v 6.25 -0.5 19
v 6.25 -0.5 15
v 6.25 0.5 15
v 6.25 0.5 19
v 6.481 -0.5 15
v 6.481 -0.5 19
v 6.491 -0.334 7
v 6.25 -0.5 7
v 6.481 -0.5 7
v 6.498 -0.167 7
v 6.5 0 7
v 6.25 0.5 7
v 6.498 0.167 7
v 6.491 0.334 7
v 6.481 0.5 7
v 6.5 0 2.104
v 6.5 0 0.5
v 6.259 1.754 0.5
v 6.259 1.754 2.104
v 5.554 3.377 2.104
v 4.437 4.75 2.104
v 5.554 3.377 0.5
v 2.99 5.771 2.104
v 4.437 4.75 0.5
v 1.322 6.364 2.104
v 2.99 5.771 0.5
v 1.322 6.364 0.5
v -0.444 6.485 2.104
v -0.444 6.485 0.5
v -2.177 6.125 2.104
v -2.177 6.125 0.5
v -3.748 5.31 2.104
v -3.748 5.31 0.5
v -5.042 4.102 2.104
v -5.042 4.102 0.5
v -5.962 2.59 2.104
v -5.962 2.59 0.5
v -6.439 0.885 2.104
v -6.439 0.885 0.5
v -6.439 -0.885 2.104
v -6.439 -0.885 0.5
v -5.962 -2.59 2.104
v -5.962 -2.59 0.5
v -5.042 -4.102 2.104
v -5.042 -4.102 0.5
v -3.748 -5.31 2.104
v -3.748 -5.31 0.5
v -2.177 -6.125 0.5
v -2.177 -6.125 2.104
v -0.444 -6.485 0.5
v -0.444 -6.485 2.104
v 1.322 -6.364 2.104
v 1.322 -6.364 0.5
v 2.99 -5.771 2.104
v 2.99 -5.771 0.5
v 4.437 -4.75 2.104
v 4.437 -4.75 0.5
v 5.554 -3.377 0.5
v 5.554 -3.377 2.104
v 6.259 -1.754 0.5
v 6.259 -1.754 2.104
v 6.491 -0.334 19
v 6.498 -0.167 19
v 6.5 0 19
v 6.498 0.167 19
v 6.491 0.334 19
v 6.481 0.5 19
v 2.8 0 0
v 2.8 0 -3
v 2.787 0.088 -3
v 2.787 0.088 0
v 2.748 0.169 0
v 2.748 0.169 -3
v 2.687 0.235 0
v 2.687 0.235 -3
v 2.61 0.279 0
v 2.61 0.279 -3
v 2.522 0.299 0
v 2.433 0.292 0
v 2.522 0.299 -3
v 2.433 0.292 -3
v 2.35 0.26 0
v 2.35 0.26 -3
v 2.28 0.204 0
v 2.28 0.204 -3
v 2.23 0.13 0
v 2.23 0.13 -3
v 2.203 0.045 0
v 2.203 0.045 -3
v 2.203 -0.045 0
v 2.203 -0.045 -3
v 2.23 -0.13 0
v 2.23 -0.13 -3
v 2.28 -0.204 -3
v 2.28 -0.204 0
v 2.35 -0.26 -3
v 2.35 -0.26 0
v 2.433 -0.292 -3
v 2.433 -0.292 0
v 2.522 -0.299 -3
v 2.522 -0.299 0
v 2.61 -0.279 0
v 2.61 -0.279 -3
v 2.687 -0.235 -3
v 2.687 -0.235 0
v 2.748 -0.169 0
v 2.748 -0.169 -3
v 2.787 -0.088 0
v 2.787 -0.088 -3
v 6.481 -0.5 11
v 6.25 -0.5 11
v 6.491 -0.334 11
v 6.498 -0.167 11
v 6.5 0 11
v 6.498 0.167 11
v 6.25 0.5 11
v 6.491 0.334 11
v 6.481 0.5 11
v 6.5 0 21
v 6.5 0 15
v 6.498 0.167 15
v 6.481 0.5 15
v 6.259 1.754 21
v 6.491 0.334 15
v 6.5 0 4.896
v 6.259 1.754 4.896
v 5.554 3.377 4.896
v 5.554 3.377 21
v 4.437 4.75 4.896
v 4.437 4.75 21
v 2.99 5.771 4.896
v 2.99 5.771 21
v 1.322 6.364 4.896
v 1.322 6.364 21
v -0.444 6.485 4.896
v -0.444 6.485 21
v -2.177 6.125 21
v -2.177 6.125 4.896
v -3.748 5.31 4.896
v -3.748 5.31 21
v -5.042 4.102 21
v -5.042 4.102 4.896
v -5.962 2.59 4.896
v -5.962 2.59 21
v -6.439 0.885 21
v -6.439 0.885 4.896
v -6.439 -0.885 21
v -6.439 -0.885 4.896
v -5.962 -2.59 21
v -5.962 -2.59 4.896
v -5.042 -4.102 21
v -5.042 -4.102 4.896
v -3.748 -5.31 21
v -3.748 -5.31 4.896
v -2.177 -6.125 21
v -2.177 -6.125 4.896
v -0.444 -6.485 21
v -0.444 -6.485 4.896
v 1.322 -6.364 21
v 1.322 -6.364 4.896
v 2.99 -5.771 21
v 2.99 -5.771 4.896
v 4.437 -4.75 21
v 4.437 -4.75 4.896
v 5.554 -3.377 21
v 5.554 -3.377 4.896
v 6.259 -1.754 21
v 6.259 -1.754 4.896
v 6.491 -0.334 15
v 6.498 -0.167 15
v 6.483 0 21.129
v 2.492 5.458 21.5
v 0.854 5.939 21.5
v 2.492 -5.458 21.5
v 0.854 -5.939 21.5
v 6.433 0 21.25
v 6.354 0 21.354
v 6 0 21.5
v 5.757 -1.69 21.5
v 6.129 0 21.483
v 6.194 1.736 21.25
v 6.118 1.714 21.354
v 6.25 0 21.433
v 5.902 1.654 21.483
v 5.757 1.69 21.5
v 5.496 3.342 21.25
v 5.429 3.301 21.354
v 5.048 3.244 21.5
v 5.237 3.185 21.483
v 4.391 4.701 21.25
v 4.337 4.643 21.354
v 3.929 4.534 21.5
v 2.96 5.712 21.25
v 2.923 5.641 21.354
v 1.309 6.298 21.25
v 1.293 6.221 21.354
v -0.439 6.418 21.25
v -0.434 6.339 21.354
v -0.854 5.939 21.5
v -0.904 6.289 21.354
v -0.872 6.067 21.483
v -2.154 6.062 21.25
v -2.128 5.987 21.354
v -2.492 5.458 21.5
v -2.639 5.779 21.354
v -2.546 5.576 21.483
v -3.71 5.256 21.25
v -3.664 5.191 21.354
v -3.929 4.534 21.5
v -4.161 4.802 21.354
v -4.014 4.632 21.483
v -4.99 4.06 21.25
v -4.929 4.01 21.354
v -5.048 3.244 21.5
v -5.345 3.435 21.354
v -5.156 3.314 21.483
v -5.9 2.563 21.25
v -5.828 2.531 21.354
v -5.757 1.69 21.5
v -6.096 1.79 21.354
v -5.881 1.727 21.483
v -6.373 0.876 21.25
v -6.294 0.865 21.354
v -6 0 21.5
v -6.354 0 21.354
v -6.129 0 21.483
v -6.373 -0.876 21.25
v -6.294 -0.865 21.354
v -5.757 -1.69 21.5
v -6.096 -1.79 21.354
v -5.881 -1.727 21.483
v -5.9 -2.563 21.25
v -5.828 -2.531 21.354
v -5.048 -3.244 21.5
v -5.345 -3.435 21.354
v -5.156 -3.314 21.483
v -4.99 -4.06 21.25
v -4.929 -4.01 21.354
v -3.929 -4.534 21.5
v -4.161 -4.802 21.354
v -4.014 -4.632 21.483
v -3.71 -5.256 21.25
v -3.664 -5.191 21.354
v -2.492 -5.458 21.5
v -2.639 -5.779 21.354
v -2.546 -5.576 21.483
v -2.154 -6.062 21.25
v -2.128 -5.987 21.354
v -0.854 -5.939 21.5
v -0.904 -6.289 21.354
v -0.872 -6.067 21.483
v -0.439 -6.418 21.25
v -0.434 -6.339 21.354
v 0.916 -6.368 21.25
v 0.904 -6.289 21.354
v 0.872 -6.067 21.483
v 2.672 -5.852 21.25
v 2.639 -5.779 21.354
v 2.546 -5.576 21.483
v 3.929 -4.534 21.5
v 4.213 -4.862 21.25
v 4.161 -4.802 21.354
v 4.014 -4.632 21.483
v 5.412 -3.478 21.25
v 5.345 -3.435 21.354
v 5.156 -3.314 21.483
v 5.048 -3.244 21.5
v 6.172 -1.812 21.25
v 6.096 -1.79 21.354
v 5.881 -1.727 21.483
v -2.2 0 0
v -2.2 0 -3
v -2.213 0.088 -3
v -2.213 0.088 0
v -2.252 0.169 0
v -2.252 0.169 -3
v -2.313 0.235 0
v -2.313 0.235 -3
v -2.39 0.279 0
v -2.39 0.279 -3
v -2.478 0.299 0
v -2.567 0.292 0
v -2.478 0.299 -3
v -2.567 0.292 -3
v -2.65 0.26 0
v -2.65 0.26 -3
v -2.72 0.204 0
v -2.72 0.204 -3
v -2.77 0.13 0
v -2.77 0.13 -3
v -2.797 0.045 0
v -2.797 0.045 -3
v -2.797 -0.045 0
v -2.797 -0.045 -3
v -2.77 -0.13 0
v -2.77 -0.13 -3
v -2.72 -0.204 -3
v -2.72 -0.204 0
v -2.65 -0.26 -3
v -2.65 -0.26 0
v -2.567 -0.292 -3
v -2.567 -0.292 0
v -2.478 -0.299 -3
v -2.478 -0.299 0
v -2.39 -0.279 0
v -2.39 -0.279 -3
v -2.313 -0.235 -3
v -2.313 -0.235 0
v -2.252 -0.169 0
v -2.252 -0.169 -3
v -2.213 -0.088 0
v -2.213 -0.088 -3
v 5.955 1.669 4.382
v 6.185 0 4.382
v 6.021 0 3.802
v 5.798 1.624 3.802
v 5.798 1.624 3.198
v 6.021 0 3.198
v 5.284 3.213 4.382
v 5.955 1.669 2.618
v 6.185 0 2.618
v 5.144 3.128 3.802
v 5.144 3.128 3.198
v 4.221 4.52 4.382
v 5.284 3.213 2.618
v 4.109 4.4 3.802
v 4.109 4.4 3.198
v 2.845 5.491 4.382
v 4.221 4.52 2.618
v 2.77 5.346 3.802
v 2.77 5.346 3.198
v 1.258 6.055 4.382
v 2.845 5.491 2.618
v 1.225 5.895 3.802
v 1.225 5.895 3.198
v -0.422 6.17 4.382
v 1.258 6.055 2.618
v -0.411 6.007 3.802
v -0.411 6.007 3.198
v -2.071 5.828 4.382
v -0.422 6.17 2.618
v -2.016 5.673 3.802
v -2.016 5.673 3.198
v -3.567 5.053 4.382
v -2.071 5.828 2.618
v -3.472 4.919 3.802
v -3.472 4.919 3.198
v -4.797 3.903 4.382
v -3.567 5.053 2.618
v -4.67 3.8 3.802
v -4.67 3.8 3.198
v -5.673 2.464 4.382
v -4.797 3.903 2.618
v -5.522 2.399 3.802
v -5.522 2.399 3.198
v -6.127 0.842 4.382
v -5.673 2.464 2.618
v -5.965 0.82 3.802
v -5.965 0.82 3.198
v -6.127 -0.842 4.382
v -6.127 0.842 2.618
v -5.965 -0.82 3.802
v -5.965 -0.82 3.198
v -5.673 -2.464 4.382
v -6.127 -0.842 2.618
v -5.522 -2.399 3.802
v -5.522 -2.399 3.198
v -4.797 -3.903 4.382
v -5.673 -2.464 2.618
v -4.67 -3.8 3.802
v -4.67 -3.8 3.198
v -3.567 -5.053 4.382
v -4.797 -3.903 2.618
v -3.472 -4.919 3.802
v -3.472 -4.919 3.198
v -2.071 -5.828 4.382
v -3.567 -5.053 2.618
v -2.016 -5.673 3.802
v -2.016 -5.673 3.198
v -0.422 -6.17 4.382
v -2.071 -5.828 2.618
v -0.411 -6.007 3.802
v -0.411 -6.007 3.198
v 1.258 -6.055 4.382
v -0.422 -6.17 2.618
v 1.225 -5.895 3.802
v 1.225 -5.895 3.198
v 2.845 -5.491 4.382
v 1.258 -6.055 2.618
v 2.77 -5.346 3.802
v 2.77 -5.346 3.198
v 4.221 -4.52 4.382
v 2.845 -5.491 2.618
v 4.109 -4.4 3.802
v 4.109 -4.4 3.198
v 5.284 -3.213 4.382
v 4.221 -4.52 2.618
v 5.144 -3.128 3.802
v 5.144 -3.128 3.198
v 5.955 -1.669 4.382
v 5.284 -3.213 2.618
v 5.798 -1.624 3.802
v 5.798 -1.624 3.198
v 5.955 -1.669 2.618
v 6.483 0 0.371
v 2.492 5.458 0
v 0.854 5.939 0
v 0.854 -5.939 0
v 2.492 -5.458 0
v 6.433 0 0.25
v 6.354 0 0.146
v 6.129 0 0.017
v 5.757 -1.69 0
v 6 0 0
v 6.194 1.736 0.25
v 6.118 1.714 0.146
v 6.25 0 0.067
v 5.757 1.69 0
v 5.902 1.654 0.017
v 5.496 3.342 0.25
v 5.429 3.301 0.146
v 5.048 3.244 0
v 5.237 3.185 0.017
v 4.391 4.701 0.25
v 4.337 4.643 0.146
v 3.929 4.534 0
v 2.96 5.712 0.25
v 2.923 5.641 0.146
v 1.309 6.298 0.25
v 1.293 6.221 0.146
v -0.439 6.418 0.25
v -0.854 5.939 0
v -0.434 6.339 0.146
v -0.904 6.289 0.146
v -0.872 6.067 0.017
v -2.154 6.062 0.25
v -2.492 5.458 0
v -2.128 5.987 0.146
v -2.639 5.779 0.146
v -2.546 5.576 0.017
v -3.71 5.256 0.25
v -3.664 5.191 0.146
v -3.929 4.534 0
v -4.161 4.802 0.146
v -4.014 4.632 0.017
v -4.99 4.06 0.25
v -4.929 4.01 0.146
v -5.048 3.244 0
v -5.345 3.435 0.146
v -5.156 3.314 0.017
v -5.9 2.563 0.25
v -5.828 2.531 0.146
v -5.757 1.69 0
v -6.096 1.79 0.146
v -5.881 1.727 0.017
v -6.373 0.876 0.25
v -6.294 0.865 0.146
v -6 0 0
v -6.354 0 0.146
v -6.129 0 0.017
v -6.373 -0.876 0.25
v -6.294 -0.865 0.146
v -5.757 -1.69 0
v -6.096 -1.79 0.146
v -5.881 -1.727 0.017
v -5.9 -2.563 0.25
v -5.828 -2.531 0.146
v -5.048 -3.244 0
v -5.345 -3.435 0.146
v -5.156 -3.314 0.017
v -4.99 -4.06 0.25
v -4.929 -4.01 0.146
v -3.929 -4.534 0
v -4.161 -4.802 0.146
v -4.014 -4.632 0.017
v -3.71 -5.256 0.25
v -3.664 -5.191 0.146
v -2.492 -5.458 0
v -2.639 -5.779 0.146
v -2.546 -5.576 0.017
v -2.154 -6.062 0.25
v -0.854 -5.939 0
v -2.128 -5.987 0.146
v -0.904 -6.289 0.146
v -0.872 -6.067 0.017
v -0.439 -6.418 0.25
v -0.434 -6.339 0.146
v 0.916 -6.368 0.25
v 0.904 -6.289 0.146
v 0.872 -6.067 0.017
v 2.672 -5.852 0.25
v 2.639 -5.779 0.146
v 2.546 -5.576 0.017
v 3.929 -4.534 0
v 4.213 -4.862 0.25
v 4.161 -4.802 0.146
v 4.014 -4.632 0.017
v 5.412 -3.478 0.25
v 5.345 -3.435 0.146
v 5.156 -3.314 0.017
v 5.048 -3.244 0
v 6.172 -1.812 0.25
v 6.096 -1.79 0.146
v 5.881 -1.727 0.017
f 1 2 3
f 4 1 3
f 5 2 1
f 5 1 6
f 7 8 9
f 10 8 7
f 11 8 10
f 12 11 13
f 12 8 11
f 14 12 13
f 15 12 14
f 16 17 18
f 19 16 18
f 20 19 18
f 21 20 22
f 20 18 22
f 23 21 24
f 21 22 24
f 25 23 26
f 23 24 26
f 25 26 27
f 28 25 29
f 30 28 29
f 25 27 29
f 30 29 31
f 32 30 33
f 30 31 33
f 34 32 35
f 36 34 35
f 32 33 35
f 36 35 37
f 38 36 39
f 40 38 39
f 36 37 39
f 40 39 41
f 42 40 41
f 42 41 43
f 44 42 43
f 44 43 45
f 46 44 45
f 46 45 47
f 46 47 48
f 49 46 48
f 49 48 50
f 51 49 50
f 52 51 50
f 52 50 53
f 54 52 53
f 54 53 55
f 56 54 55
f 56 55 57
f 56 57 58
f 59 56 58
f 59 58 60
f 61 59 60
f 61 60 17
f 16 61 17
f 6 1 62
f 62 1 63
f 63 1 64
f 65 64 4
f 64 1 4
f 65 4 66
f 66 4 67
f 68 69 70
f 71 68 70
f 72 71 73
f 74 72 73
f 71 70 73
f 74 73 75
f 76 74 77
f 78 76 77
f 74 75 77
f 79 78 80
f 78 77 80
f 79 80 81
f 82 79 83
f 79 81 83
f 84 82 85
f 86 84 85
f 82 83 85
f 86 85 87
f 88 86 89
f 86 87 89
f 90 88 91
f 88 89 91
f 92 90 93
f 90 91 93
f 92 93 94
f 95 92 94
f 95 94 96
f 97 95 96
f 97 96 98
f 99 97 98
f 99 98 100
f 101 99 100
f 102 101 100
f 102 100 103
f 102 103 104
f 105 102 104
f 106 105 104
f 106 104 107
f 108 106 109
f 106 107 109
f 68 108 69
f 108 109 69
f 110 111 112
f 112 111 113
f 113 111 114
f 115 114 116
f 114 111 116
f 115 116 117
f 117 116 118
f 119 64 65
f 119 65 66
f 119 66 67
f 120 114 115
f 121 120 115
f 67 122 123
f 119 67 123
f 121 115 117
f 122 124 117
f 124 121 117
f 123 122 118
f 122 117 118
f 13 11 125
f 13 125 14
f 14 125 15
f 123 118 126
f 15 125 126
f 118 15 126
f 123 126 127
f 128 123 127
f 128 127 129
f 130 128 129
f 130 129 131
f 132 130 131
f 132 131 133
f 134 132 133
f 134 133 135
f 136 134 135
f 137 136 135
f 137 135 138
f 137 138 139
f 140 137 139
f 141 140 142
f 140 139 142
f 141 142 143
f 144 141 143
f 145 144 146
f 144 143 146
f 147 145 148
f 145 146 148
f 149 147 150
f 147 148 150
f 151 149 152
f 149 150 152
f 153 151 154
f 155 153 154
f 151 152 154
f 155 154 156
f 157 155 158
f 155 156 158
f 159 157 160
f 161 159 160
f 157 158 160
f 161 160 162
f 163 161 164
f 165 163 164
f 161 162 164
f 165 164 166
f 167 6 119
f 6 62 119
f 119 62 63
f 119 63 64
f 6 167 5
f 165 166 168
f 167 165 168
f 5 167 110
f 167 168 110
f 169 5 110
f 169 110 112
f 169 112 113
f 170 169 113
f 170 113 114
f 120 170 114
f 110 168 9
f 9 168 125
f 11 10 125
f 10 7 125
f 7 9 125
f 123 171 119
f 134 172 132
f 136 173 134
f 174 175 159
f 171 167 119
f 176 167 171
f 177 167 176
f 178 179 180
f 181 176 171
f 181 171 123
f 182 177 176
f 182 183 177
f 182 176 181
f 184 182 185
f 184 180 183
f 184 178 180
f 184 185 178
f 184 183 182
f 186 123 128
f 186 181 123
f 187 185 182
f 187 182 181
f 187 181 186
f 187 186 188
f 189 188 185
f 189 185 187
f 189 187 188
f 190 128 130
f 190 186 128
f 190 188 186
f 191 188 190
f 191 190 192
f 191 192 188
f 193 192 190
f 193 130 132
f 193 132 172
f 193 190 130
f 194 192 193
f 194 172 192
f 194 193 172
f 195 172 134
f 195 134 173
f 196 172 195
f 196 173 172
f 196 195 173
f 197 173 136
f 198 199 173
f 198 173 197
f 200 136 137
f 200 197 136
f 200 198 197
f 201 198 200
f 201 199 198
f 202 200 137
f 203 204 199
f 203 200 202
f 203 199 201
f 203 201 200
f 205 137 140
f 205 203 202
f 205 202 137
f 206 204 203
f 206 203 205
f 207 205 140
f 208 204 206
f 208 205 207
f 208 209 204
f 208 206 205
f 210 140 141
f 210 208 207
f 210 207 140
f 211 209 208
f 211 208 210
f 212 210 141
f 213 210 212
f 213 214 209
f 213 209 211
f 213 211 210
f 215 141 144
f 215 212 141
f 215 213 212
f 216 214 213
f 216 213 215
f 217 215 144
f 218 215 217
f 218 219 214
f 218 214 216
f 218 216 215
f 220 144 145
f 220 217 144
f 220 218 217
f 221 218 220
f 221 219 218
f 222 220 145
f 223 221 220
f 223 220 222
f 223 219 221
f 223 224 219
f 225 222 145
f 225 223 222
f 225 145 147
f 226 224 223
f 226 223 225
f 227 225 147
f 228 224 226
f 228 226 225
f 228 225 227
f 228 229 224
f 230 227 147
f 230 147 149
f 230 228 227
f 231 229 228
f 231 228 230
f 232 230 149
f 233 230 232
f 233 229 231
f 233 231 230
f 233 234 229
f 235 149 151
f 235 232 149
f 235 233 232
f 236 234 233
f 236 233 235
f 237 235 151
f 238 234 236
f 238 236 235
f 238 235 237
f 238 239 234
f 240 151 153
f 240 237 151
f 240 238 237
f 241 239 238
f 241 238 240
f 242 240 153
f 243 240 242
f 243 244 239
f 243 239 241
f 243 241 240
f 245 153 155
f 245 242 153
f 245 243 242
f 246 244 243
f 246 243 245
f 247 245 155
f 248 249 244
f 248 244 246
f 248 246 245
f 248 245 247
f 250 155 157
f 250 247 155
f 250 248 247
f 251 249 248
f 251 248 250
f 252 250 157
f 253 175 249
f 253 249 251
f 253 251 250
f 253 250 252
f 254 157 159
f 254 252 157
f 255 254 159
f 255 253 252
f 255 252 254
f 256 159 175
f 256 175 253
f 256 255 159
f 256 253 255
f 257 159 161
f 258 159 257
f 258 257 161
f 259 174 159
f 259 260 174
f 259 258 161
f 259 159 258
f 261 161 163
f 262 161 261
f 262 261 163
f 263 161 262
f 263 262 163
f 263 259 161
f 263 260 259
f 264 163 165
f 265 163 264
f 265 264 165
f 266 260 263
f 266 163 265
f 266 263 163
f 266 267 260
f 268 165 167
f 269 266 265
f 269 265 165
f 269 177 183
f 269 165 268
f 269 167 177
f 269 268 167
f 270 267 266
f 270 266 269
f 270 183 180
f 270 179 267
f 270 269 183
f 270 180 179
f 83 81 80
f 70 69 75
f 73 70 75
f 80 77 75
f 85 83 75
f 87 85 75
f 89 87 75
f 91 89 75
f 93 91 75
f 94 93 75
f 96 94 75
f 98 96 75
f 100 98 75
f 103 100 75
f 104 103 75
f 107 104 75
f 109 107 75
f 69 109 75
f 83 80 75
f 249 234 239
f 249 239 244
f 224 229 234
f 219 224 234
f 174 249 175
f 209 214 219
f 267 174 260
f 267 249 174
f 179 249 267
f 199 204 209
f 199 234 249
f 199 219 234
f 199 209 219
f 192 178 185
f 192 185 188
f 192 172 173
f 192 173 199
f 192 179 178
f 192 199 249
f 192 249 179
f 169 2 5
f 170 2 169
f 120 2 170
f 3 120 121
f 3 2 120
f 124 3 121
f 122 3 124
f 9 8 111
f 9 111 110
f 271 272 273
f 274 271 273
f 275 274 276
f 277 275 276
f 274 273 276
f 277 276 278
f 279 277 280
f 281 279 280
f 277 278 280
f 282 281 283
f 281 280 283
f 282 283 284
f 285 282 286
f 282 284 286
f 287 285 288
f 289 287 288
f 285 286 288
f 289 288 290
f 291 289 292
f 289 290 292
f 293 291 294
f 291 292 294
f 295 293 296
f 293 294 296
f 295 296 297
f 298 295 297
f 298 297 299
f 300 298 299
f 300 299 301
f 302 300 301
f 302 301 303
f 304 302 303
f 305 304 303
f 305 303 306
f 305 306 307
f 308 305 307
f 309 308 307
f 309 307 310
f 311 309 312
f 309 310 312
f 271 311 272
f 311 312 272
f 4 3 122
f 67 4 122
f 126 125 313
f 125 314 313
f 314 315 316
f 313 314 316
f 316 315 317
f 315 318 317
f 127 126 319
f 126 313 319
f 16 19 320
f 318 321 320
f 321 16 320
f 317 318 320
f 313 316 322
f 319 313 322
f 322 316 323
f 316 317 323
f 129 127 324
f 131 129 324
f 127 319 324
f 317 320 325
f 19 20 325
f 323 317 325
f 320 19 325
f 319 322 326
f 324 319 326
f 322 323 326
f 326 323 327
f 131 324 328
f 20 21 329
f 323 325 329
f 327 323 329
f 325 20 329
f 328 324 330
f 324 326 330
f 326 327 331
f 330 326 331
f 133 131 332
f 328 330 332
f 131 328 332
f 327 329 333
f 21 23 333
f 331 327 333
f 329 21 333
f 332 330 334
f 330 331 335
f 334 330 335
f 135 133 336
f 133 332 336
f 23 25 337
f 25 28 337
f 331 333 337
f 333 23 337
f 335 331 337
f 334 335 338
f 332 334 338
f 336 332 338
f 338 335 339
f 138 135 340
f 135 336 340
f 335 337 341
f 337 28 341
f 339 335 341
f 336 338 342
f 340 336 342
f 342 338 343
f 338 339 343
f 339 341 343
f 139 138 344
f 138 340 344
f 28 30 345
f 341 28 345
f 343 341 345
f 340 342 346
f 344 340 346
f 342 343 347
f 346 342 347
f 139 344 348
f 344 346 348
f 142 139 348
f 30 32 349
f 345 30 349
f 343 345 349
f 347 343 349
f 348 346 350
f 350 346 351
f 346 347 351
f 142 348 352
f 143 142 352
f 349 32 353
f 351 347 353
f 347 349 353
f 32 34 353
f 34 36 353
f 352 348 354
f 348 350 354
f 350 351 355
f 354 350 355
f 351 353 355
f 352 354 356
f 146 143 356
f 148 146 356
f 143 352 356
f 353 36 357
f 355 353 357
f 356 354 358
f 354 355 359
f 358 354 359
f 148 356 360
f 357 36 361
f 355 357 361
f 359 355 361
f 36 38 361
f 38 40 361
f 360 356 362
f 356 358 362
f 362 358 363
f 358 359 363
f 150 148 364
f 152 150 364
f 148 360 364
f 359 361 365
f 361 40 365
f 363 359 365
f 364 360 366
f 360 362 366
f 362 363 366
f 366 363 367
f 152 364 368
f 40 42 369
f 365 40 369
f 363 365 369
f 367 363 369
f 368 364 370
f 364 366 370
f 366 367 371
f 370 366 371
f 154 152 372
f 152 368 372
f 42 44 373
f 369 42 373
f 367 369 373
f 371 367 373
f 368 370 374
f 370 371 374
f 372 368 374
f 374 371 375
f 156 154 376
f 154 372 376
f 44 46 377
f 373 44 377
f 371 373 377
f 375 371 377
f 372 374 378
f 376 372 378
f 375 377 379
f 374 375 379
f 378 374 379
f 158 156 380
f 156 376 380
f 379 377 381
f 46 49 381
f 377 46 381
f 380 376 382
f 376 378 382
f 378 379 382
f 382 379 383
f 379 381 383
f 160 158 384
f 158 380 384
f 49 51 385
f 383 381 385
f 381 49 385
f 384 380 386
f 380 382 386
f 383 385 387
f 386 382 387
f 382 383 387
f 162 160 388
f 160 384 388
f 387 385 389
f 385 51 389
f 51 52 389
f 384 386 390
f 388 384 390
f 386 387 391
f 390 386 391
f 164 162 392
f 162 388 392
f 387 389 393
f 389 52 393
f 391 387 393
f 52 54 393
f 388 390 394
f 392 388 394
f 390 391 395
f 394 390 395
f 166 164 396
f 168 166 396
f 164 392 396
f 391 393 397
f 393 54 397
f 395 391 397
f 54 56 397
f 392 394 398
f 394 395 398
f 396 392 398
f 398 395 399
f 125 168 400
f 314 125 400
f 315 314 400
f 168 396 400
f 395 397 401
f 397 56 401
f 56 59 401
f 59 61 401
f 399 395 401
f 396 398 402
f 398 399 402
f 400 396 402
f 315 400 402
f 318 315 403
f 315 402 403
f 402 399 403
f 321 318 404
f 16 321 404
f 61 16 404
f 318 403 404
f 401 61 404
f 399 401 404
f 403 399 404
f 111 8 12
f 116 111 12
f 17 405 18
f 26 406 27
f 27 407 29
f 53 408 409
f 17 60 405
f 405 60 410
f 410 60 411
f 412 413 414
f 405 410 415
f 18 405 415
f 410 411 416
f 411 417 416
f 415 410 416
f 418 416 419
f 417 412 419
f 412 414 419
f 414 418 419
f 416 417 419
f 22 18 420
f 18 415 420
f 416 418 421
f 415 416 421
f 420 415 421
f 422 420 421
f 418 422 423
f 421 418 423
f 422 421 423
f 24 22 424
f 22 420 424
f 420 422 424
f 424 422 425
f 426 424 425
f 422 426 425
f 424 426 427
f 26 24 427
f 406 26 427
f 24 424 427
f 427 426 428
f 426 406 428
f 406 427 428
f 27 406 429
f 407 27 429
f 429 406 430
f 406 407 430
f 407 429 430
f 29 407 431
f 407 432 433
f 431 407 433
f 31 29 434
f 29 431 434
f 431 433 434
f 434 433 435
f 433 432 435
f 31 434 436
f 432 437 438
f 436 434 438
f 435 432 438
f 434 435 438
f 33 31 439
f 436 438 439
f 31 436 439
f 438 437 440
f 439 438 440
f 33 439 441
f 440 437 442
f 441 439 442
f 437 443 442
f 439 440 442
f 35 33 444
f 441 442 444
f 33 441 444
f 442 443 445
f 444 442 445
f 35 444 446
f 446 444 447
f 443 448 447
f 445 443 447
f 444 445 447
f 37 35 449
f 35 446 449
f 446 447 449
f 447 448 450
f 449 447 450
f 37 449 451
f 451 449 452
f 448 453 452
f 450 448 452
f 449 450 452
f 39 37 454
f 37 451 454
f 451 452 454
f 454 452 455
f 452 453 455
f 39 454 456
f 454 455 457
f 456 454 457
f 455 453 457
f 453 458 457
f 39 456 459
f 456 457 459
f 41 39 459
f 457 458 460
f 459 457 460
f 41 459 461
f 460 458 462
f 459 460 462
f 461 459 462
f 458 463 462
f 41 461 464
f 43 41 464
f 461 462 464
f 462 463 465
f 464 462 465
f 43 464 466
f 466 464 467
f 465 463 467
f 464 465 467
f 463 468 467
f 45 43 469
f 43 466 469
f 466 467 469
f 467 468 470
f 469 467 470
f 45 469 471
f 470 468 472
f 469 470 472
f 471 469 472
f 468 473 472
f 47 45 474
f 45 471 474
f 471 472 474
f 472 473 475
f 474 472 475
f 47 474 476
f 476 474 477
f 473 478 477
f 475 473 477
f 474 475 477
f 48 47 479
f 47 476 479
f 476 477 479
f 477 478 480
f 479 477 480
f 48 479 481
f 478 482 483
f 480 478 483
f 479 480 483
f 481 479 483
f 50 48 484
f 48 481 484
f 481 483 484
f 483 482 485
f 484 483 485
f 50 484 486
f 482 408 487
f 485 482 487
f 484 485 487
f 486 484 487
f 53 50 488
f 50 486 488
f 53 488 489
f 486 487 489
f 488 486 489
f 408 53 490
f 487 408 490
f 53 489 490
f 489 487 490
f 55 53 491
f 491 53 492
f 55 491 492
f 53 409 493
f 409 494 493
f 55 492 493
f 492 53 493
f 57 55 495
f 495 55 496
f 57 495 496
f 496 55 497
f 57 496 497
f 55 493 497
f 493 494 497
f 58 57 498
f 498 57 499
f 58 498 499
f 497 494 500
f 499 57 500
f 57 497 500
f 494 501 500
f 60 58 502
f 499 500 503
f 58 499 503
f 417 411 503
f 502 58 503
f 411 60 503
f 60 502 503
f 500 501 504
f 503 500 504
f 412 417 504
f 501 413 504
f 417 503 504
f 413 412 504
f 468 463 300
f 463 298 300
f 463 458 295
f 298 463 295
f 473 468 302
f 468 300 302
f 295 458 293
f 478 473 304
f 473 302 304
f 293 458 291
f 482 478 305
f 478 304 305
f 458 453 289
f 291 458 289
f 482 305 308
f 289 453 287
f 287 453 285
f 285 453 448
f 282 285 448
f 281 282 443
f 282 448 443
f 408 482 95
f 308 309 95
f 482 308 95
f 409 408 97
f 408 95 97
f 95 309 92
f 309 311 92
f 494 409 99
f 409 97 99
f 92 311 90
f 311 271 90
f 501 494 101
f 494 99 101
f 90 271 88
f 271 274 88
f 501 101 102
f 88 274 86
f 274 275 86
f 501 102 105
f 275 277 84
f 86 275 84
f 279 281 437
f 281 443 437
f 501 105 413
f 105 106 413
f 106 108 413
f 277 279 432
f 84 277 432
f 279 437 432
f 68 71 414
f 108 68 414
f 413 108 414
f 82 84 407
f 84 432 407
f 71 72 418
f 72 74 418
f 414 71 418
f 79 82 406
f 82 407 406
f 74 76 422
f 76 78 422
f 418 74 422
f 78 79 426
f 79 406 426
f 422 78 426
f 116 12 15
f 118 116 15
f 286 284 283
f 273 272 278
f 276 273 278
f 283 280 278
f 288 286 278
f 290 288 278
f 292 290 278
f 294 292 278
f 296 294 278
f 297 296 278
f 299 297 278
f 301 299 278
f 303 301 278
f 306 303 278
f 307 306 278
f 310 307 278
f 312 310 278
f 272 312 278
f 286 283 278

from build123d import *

# Parameters (mm, degrees)
CYLINDER002_R     = 0.3
CYLINDER002_DEPTH = 3
CYLINDER001_R     = 0.3
CYLINDER001_DEPTH = 3
BOX001_W          = 1
BOX001_H          = 1
BOX001_DEPTH      = 4
BOX_W             = 1
BOX_H             = 1
BOX_DEPTH         = 4
TORUS_R           = 2.2
CYLINDER_R        = 6.5
CYLINDER_DEPTH    = 21.5
FILLET_R          = 0.5


with BuildPart() as pin2:
    # Cylinder002 → Cylinder002 (new body)
    with BuildSketch(Plane(origin=(2.5, 0, -3), x_dir=(1, 0, 0), z_dir=(0, 0, 1))):
        Circle(CYLINDER002_R)
    extrude(amount=CYLINDER002_DEPTH)


with BuildPart() as pin1:
    # Cylinder001 → Cylinder001 (new body)
    with BuildSketch(Plane(origin=(-2.5, 0, -3), x_dir=(1, 0, 0), z_dir=(0, 0, 1))):
        Circle(CYLINDER001_R)
    extrude(amount=CYLINDER001_DEPTH)


with BuildPart() as box001:
    # Box001 → Box001 (new body)
    with BuildSketch(Plane(origin=(6.25, -0.5, 15), x_dir=(1, 0, 0), z_dir=(0, 0, 1))):
        with Locations((0.5, 0.5)):
            Rectangle(BOX001_W, BOX001_H)
    extrude(amount=BOX001_DEPTH)


with BuildPart() as box:
    # Box → Box (new body)
    with BuildSketch(Plane(origin=(6.25, -0.5, 7), x_dir=(1, 0, 0), z_dir=(0, 0, 1))):
        with Locations((0.5, 0.5)):
            Rectangle(BOX_W, BOX_H)
    extrude(amount=BOX_DEPTH)


with BuildPart() as ring:
    # Torus → Torus (revolve)
    with BuildSketch(Plane(origin=(0, 0, 3.5), x_dir=(1, 0, 0), z_dir=(0, -1, 0))):
        with Locations((8.2, 0)):
            Circle(TORUS_R)
    revolve(axis=Axis((0, 0, 3.5), (0, 0, 1)))


with BuildPart() as cappr500w60d1250h2000:
    # Cylinder → Cylinder (new body)
    with BuildSketch(Plane.XY):
        Circle(CYLINDER_R)
    extrude(amount=CYLINDER_DEPTH)

    # Fillet
    fillet_edges = [cappr500w60d1250h2000.edges().sort_by_distance(p)[0] for p in [
        (-6.5, 0, 21.5),
        (-6.5, 0, 0),
    ]]
    fillet(fillet_edges, radius=FILLET_R)

    # Cut: cut Ring
    add(ring.part, mode=Mode.SUBTRACT)

    # Cut001: cut Box
    add(box.part, mode=Mode.SUBTRACT)

    # Cut002: cut Box001
    add(box001.part, mode=Mode.SUBTRACT)

    # Fusion: union Pin1+
    add(pin1.part)

    # Fusion001: union Pin2-
    add(pin2.part)


solid = cappr500w60d1250h2000.part
